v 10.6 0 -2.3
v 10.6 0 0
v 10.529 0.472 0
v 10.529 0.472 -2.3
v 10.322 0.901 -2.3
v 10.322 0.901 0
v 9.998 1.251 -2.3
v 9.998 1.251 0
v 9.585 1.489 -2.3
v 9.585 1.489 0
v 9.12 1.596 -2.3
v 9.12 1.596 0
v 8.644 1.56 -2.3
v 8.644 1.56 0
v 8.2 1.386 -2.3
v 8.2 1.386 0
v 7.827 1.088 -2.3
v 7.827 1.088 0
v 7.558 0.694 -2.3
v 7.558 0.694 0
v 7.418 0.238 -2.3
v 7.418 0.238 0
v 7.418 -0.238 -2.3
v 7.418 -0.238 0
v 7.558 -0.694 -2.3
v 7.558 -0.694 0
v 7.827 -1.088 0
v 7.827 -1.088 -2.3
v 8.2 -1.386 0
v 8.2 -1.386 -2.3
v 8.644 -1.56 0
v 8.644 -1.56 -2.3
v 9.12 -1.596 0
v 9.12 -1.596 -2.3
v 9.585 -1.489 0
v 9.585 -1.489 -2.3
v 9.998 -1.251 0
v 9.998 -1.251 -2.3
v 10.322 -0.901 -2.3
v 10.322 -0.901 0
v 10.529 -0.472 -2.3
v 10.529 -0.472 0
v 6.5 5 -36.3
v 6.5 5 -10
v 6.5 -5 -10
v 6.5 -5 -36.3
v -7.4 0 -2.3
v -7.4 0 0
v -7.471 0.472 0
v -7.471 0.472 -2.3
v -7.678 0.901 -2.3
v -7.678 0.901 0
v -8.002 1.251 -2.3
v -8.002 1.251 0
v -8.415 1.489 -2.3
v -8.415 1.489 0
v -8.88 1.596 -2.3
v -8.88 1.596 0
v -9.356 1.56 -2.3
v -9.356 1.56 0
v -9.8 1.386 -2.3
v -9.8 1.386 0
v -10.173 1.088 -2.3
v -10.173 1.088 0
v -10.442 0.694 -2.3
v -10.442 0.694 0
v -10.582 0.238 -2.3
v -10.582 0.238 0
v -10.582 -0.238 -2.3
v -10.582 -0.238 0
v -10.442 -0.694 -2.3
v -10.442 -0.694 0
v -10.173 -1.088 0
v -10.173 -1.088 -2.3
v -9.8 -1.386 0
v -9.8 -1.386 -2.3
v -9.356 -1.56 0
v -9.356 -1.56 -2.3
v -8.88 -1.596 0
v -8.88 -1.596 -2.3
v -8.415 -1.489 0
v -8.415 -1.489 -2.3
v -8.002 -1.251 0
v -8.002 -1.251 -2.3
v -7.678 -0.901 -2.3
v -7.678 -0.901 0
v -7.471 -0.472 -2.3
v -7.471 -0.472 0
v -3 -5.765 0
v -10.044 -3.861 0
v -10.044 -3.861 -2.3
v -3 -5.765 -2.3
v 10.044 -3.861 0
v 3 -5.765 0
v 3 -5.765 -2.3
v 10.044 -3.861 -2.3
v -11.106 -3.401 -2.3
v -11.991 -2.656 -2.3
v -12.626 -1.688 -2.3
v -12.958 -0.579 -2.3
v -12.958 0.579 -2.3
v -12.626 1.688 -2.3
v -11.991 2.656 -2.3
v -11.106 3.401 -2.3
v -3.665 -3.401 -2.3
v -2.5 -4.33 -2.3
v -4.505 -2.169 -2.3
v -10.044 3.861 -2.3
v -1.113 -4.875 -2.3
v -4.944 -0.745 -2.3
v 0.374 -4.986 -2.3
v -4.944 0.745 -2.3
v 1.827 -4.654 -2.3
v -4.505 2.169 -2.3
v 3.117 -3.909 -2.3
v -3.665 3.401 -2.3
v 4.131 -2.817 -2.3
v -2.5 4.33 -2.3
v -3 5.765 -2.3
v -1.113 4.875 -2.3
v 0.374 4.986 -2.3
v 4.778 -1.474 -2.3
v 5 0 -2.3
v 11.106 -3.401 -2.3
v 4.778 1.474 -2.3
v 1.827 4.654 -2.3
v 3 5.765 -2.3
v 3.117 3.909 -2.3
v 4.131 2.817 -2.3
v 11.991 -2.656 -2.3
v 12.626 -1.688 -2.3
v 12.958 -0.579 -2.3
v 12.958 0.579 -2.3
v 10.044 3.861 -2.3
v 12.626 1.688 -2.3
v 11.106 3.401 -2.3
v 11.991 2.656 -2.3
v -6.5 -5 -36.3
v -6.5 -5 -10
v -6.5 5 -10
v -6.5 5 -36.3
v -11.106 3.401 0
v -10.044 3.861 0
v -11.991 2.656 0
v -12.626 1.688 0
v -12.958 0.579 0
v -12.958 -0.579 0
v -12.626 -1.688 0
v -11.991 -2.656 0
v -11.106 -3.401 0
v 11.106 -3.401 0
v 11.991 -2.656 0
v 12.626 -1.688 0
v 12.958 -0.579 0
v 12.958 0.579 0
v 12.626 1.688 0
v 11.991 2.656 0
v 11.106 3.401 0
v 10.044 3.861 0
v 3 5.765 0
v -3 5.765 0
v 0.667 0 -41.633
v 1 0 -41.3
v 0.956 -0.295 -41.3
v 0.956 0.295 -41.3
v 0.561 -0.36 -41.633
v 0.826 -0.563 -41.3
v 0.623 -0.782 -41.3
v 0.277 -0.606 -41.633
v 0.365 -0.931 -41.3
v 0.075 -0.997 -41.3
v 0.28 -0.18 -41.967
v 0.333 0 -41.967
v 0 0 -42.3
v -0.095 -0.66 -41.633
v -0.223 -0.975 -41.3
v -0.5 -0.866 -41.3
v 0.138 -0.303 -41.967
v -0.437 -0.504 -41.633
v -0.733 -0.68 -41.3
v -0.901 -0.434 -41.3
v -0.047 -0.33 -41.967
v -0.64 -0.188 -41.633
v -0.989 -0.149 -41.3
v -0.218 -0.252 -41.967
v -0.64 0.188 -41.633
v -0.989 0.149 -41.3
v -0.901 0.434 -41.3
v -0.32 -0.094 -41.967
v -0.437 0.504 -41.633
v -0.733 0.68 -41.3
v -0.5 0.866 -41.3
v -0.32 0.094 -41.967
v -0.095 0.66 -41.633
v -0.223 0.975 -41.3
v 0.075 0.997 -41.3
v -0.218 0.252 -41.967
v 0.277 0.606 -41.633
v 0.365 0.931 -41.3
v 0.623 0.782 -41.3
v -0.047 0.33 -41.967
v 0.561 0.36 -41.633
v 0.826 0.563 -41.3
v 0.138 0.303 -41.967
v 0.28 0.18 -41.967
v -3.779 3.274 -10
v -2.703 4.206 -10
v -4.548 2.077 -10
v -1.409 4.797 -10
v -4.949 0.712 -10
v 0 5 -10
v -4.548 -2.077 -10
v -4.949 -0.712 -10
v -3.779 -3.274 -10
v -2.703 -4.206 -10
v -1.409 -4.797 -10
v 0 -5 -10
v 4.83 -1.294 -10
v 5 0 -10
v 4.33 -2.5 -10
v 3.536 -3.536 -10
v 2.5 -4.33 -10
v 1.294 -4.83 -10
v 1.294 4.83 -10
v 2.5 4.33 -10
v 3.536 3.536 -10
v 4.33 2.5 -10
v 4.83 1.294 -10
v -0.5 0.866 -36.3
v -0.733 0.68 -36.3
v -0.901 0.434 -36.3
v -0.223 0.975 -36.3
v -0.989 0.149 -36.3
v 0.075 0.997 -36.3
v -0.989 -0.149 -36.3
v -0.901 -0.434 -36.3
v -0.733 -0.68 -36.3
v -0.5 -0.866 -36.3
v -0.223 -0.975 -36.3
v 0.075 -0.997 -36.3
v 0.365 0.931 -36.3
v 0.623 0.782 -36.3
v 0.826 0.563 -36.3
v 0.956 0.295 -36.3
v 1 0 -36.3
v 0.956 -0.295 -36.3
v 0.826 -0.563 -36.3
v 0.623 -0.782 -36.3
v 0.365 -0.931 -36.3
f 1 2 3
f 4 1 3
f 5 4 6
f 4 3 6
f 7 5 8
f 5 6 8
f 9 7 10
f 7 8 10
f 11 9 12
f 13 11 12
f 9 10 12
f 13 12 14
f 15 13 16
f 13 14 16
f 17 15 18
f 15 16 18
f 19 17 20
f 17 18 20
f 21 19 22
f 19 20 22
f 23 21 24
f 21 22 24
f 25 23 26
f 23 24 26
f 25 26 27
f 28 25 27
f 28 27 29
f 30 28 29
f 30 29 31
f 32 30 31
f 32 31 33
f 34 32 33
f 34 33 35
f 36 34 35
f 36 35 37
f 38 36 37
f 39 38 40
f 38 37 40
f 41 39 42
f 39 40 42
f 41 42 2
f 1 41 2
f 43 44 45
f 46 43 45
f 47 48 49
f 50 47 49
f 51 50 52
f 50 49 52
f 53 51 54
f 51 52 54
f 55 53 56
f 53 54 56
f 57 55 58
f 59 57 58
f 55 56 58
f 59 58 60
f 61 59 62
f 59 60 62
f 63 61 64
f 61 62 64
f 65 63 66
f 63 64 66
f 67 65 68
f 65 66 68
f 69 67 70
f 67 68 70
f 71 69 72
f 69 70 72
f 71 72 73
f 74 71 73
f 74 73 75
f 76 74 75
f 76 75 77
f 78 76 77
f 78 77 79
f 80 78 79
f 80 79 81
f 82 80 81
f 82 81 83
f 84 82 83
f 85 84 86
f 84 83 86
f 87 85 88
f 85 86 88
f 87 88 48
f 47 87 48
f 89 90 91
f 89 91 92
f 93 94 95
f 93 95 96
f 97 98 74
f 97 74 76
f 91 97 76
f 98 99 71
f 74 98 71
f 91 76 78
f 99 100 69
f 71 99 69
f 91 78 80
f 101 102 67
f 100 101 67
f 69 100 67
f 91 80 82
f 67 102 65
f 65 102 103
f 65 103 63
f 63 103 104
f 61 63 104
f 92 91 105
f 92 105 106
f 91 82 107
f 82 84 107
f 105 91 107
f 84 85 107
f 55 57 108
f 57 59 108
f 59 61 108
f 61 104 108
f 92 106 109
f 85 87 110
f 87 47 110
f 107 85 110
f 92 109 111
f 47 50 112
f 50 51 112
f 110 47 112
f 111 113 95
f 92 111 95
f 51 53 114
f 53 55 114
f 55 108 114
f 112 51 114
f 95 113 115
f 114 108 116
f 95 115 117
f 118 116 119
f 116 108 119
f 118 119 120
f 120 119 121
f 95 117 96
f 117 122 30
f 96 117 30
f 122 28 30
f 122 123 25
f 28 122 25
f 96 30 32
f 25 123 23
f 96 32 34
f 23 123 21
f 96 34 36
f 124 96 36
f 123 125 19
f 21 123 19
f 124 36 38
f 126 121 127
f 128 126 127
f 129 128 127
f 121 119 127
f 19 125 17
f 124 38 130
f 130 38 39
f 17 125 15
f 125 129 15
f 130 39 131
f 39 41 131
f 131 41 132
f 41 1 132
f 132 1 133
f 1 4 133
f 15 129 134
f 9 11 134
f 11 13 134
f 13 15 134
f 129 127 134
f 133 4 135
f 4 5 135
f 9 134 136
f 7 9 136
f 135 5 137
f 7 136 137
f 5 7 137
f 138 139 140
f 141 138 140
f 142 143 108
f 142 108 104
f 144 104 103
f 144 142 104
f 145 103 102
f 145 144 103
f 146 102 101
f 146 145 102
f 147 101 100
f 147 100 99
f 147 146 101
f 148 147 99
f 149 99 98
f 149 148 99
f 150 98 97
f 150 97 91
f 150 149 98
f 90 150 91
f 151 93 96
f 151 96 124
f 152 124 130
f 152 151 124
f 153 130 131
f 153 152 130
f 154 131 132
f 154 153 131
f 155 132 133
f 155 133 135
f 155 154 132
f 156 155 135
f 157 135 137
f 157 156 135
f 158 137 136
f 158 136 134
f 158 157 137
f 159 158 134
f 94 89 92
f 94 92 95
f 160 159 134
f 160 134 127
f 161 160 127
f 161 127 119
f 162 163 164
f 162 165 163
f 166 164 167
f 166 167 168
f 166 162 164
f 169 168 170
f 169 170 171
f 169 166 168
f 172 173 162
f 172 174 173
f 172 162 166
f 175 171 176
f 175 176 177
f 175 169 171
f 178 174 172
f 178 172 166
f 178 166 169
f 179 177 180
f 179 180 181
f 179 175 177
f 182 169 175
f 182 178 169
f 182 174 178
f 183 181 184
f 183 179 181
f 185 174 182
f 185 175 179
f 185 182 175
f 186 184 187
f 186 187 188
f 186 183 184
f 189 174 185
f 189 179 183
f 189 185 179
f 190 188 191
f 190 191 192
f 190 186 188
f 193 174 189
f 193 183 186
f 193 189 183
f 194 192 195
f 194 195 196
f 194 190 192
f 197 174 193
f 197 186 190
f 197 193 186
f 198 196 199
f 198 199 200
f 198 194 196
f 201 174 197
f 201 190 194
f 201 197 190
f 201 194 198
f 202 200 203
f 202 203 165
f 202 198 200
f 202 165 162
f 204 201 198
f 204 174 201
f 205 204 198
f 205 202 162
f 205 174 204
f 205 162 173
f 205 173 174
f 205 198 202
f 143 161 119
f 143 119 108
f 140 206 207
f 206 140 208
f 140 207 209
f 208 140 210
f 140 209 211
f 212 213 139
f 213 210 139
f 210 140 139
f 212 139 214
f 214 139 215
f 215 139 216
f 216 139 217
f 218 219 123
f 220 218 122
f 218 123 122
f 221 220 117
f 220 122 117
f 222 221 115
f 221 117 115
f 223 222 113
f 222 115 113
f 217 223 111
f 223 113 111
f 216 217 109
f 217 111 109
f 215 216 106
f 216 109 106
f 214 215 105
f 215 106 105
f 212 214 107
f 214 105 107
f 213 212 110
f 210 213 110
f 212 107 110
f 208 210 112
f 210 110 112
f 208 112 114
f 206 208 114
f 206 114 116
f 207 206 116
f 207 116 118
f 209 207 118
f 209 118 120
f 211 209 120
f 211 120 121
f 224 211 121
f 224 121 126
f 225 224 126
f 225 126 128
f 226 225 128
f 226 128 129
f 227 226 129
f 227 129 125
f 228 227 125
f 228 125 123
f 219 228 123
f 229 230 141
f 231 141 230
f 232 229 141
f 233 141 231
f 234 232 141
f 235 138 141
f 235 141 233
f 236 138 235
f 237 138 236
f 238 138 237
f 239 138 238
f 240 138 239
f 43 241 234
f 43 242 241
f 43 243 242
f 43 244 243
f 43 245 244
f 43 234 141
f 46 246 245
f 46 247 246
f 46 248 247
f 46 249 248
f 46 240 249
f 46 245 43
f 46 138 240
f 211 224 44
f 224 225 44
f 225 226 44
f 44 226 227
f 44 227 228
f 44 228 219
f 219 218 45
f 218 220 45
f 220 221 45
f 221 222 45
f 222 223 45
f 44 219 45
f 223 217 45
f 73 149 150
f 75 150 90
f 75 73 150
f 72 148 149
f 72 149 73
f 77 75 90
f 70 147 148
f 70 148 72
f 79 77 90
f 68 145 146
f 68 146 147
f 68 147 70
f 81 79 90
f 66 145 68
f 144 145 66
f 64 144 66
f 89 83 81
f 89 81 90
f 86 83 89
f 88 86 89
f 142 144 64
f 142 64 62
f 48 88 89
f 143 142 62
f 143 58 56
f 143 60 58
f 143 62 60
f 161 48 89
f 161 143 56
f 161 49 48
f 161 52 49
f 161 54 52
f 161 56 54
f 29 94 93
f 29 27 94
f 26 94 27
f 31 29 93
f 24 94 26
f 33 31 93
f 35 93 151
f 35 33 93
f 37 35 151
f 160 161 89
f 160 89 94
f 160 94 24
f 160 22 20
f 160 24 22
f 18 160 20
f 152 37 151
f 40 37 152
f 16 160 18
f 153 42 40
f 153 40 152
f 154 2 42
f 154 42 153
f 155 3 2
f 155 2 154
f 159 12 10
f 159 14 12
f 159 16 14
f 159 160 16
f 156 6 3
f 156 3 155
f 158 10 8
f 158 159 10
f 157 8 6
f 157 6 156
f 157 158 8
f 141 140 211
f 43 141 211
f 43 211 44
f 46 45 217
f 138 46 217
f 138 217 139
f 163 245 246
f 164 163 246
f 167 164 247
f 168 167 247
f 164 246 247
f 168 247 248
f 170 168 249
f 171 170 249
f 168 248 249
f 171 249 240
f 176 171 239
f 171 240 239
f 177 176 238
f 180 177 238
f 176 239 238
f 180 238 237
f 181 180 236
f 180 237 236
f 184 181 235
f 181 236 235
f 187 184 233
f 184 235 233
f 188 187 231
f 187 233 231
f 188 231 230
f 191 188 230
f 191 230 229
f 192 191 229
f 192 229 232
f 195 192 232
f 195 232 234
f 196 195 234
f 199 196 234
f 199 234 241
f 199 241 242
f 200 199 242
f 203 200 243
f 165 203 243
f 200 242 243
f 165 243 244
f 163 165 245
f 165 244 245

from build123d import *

# Parameters (mm, degrees)
F0_R     = 1.6
F1_DEPTH = 2.3
F2_R     = 5
F3_DEPTH = 7.7
F5_DEPTH = 26.3
F6_R     = 1
F7_DEPTH = 6
F8_SIZE  = 1


with BuildPart() as f1:
    # F0 (on Top) → F1 (new body)
    with BuildSketch(Plane.XY):
        with BuildLine():
            Line((-3, 5.765), (-10.043565, 3.861473))
            ThreePointArc((-10.043565, 3.861473), (-13, 0), (-10.043565, -3.861473))
            Line((-10.043565, -3.861473), (-3, -5.765))
            Line((-3, -5.765), (0, -5.765))
            Line((0, -5.765), (3, -5.765))
            Line((3, -5.765), (10.043565, -3.861473))
            ThreePointArc((10.043565, -3.861473), (13, 0), (10.043565, 3.861473))
            Line((10.043565, 3.861473), (3, 5.765))
            Line((3, 5.765), (0, 5.765))
            Line((0, 5.765), (-3, 5.765))
        make_face()
        with Locations((-9, 0)):
            Circle(F0_R, mode=Mode.SUBTRACT)
        with Locations((9, 0)):
            Circle(F0_R, mode=Mode.SUBTRACT)
    extrude(amount=-F1_DEPTH)

    # F2 (on face) → F3 (join)
    with BuildSketch(Plane(origin=(0, 0, -2.3), x_dir=(1, 0, 0), z_dir=(0, 0, -1))):
        Circle(F2_R)
    extrude(amount=F3_DEPTH)

    # F4 (on face) → F5 (join)
    with BuildSketch(Plane(origin=(0, 0, -10), x_dir=(1, 0, 0), z_dir=(0, 0, -1))):
        with BuildLine():
            Line((6.5, -5), (6.5, 5))
            Line((6.5, 5), (0, 5))
            ThreePointArc((0, 5), (3.535534, 3.535534), (5, 0))
            ThreePointArc((5, 0), (3.535534, -3.535534), (0, -5))
            Line((0, -5), (6.5, -5))
        make_face()
        with BuildLine():
            ThreePointArc((0, -5), (-5, 0), (0, 5))
            Line((0, 5), (-6.5, 5))
            Line((-6.5, 5), (-6.5, -5))
            Line((-6.5, -5), (0, -5))
        make_face()
        with BuildLine():
            ThreePointArc((5, 0), (3.535534, 3.535534), (0, 5))
            ThreePointArc((0, 5), (-5, 0), (0, -5))
            ThreePointArc((0, -5), (3.535534, -3.535534), (5, 0))
        make_face()
    extrude(amount=F5_DEPTH)

    # F6 (on face) → F7 (join)
    with BuildSketch(Plane(origin=(0, 0, -36.3), x_dir=(1, 0, 0), z_dir=(0, 0, -1))):
        Circle(F6_R)
    extrude(amount=F7_DEPTH)

    # F8
    f8_edges = [f1.edges().sort_by_distance(p)[0] for p in [
        (-1, 0, -42.3),
    ]]
    chamfer(f8_edges, length=F8_SIZE)


solid = f1.part
